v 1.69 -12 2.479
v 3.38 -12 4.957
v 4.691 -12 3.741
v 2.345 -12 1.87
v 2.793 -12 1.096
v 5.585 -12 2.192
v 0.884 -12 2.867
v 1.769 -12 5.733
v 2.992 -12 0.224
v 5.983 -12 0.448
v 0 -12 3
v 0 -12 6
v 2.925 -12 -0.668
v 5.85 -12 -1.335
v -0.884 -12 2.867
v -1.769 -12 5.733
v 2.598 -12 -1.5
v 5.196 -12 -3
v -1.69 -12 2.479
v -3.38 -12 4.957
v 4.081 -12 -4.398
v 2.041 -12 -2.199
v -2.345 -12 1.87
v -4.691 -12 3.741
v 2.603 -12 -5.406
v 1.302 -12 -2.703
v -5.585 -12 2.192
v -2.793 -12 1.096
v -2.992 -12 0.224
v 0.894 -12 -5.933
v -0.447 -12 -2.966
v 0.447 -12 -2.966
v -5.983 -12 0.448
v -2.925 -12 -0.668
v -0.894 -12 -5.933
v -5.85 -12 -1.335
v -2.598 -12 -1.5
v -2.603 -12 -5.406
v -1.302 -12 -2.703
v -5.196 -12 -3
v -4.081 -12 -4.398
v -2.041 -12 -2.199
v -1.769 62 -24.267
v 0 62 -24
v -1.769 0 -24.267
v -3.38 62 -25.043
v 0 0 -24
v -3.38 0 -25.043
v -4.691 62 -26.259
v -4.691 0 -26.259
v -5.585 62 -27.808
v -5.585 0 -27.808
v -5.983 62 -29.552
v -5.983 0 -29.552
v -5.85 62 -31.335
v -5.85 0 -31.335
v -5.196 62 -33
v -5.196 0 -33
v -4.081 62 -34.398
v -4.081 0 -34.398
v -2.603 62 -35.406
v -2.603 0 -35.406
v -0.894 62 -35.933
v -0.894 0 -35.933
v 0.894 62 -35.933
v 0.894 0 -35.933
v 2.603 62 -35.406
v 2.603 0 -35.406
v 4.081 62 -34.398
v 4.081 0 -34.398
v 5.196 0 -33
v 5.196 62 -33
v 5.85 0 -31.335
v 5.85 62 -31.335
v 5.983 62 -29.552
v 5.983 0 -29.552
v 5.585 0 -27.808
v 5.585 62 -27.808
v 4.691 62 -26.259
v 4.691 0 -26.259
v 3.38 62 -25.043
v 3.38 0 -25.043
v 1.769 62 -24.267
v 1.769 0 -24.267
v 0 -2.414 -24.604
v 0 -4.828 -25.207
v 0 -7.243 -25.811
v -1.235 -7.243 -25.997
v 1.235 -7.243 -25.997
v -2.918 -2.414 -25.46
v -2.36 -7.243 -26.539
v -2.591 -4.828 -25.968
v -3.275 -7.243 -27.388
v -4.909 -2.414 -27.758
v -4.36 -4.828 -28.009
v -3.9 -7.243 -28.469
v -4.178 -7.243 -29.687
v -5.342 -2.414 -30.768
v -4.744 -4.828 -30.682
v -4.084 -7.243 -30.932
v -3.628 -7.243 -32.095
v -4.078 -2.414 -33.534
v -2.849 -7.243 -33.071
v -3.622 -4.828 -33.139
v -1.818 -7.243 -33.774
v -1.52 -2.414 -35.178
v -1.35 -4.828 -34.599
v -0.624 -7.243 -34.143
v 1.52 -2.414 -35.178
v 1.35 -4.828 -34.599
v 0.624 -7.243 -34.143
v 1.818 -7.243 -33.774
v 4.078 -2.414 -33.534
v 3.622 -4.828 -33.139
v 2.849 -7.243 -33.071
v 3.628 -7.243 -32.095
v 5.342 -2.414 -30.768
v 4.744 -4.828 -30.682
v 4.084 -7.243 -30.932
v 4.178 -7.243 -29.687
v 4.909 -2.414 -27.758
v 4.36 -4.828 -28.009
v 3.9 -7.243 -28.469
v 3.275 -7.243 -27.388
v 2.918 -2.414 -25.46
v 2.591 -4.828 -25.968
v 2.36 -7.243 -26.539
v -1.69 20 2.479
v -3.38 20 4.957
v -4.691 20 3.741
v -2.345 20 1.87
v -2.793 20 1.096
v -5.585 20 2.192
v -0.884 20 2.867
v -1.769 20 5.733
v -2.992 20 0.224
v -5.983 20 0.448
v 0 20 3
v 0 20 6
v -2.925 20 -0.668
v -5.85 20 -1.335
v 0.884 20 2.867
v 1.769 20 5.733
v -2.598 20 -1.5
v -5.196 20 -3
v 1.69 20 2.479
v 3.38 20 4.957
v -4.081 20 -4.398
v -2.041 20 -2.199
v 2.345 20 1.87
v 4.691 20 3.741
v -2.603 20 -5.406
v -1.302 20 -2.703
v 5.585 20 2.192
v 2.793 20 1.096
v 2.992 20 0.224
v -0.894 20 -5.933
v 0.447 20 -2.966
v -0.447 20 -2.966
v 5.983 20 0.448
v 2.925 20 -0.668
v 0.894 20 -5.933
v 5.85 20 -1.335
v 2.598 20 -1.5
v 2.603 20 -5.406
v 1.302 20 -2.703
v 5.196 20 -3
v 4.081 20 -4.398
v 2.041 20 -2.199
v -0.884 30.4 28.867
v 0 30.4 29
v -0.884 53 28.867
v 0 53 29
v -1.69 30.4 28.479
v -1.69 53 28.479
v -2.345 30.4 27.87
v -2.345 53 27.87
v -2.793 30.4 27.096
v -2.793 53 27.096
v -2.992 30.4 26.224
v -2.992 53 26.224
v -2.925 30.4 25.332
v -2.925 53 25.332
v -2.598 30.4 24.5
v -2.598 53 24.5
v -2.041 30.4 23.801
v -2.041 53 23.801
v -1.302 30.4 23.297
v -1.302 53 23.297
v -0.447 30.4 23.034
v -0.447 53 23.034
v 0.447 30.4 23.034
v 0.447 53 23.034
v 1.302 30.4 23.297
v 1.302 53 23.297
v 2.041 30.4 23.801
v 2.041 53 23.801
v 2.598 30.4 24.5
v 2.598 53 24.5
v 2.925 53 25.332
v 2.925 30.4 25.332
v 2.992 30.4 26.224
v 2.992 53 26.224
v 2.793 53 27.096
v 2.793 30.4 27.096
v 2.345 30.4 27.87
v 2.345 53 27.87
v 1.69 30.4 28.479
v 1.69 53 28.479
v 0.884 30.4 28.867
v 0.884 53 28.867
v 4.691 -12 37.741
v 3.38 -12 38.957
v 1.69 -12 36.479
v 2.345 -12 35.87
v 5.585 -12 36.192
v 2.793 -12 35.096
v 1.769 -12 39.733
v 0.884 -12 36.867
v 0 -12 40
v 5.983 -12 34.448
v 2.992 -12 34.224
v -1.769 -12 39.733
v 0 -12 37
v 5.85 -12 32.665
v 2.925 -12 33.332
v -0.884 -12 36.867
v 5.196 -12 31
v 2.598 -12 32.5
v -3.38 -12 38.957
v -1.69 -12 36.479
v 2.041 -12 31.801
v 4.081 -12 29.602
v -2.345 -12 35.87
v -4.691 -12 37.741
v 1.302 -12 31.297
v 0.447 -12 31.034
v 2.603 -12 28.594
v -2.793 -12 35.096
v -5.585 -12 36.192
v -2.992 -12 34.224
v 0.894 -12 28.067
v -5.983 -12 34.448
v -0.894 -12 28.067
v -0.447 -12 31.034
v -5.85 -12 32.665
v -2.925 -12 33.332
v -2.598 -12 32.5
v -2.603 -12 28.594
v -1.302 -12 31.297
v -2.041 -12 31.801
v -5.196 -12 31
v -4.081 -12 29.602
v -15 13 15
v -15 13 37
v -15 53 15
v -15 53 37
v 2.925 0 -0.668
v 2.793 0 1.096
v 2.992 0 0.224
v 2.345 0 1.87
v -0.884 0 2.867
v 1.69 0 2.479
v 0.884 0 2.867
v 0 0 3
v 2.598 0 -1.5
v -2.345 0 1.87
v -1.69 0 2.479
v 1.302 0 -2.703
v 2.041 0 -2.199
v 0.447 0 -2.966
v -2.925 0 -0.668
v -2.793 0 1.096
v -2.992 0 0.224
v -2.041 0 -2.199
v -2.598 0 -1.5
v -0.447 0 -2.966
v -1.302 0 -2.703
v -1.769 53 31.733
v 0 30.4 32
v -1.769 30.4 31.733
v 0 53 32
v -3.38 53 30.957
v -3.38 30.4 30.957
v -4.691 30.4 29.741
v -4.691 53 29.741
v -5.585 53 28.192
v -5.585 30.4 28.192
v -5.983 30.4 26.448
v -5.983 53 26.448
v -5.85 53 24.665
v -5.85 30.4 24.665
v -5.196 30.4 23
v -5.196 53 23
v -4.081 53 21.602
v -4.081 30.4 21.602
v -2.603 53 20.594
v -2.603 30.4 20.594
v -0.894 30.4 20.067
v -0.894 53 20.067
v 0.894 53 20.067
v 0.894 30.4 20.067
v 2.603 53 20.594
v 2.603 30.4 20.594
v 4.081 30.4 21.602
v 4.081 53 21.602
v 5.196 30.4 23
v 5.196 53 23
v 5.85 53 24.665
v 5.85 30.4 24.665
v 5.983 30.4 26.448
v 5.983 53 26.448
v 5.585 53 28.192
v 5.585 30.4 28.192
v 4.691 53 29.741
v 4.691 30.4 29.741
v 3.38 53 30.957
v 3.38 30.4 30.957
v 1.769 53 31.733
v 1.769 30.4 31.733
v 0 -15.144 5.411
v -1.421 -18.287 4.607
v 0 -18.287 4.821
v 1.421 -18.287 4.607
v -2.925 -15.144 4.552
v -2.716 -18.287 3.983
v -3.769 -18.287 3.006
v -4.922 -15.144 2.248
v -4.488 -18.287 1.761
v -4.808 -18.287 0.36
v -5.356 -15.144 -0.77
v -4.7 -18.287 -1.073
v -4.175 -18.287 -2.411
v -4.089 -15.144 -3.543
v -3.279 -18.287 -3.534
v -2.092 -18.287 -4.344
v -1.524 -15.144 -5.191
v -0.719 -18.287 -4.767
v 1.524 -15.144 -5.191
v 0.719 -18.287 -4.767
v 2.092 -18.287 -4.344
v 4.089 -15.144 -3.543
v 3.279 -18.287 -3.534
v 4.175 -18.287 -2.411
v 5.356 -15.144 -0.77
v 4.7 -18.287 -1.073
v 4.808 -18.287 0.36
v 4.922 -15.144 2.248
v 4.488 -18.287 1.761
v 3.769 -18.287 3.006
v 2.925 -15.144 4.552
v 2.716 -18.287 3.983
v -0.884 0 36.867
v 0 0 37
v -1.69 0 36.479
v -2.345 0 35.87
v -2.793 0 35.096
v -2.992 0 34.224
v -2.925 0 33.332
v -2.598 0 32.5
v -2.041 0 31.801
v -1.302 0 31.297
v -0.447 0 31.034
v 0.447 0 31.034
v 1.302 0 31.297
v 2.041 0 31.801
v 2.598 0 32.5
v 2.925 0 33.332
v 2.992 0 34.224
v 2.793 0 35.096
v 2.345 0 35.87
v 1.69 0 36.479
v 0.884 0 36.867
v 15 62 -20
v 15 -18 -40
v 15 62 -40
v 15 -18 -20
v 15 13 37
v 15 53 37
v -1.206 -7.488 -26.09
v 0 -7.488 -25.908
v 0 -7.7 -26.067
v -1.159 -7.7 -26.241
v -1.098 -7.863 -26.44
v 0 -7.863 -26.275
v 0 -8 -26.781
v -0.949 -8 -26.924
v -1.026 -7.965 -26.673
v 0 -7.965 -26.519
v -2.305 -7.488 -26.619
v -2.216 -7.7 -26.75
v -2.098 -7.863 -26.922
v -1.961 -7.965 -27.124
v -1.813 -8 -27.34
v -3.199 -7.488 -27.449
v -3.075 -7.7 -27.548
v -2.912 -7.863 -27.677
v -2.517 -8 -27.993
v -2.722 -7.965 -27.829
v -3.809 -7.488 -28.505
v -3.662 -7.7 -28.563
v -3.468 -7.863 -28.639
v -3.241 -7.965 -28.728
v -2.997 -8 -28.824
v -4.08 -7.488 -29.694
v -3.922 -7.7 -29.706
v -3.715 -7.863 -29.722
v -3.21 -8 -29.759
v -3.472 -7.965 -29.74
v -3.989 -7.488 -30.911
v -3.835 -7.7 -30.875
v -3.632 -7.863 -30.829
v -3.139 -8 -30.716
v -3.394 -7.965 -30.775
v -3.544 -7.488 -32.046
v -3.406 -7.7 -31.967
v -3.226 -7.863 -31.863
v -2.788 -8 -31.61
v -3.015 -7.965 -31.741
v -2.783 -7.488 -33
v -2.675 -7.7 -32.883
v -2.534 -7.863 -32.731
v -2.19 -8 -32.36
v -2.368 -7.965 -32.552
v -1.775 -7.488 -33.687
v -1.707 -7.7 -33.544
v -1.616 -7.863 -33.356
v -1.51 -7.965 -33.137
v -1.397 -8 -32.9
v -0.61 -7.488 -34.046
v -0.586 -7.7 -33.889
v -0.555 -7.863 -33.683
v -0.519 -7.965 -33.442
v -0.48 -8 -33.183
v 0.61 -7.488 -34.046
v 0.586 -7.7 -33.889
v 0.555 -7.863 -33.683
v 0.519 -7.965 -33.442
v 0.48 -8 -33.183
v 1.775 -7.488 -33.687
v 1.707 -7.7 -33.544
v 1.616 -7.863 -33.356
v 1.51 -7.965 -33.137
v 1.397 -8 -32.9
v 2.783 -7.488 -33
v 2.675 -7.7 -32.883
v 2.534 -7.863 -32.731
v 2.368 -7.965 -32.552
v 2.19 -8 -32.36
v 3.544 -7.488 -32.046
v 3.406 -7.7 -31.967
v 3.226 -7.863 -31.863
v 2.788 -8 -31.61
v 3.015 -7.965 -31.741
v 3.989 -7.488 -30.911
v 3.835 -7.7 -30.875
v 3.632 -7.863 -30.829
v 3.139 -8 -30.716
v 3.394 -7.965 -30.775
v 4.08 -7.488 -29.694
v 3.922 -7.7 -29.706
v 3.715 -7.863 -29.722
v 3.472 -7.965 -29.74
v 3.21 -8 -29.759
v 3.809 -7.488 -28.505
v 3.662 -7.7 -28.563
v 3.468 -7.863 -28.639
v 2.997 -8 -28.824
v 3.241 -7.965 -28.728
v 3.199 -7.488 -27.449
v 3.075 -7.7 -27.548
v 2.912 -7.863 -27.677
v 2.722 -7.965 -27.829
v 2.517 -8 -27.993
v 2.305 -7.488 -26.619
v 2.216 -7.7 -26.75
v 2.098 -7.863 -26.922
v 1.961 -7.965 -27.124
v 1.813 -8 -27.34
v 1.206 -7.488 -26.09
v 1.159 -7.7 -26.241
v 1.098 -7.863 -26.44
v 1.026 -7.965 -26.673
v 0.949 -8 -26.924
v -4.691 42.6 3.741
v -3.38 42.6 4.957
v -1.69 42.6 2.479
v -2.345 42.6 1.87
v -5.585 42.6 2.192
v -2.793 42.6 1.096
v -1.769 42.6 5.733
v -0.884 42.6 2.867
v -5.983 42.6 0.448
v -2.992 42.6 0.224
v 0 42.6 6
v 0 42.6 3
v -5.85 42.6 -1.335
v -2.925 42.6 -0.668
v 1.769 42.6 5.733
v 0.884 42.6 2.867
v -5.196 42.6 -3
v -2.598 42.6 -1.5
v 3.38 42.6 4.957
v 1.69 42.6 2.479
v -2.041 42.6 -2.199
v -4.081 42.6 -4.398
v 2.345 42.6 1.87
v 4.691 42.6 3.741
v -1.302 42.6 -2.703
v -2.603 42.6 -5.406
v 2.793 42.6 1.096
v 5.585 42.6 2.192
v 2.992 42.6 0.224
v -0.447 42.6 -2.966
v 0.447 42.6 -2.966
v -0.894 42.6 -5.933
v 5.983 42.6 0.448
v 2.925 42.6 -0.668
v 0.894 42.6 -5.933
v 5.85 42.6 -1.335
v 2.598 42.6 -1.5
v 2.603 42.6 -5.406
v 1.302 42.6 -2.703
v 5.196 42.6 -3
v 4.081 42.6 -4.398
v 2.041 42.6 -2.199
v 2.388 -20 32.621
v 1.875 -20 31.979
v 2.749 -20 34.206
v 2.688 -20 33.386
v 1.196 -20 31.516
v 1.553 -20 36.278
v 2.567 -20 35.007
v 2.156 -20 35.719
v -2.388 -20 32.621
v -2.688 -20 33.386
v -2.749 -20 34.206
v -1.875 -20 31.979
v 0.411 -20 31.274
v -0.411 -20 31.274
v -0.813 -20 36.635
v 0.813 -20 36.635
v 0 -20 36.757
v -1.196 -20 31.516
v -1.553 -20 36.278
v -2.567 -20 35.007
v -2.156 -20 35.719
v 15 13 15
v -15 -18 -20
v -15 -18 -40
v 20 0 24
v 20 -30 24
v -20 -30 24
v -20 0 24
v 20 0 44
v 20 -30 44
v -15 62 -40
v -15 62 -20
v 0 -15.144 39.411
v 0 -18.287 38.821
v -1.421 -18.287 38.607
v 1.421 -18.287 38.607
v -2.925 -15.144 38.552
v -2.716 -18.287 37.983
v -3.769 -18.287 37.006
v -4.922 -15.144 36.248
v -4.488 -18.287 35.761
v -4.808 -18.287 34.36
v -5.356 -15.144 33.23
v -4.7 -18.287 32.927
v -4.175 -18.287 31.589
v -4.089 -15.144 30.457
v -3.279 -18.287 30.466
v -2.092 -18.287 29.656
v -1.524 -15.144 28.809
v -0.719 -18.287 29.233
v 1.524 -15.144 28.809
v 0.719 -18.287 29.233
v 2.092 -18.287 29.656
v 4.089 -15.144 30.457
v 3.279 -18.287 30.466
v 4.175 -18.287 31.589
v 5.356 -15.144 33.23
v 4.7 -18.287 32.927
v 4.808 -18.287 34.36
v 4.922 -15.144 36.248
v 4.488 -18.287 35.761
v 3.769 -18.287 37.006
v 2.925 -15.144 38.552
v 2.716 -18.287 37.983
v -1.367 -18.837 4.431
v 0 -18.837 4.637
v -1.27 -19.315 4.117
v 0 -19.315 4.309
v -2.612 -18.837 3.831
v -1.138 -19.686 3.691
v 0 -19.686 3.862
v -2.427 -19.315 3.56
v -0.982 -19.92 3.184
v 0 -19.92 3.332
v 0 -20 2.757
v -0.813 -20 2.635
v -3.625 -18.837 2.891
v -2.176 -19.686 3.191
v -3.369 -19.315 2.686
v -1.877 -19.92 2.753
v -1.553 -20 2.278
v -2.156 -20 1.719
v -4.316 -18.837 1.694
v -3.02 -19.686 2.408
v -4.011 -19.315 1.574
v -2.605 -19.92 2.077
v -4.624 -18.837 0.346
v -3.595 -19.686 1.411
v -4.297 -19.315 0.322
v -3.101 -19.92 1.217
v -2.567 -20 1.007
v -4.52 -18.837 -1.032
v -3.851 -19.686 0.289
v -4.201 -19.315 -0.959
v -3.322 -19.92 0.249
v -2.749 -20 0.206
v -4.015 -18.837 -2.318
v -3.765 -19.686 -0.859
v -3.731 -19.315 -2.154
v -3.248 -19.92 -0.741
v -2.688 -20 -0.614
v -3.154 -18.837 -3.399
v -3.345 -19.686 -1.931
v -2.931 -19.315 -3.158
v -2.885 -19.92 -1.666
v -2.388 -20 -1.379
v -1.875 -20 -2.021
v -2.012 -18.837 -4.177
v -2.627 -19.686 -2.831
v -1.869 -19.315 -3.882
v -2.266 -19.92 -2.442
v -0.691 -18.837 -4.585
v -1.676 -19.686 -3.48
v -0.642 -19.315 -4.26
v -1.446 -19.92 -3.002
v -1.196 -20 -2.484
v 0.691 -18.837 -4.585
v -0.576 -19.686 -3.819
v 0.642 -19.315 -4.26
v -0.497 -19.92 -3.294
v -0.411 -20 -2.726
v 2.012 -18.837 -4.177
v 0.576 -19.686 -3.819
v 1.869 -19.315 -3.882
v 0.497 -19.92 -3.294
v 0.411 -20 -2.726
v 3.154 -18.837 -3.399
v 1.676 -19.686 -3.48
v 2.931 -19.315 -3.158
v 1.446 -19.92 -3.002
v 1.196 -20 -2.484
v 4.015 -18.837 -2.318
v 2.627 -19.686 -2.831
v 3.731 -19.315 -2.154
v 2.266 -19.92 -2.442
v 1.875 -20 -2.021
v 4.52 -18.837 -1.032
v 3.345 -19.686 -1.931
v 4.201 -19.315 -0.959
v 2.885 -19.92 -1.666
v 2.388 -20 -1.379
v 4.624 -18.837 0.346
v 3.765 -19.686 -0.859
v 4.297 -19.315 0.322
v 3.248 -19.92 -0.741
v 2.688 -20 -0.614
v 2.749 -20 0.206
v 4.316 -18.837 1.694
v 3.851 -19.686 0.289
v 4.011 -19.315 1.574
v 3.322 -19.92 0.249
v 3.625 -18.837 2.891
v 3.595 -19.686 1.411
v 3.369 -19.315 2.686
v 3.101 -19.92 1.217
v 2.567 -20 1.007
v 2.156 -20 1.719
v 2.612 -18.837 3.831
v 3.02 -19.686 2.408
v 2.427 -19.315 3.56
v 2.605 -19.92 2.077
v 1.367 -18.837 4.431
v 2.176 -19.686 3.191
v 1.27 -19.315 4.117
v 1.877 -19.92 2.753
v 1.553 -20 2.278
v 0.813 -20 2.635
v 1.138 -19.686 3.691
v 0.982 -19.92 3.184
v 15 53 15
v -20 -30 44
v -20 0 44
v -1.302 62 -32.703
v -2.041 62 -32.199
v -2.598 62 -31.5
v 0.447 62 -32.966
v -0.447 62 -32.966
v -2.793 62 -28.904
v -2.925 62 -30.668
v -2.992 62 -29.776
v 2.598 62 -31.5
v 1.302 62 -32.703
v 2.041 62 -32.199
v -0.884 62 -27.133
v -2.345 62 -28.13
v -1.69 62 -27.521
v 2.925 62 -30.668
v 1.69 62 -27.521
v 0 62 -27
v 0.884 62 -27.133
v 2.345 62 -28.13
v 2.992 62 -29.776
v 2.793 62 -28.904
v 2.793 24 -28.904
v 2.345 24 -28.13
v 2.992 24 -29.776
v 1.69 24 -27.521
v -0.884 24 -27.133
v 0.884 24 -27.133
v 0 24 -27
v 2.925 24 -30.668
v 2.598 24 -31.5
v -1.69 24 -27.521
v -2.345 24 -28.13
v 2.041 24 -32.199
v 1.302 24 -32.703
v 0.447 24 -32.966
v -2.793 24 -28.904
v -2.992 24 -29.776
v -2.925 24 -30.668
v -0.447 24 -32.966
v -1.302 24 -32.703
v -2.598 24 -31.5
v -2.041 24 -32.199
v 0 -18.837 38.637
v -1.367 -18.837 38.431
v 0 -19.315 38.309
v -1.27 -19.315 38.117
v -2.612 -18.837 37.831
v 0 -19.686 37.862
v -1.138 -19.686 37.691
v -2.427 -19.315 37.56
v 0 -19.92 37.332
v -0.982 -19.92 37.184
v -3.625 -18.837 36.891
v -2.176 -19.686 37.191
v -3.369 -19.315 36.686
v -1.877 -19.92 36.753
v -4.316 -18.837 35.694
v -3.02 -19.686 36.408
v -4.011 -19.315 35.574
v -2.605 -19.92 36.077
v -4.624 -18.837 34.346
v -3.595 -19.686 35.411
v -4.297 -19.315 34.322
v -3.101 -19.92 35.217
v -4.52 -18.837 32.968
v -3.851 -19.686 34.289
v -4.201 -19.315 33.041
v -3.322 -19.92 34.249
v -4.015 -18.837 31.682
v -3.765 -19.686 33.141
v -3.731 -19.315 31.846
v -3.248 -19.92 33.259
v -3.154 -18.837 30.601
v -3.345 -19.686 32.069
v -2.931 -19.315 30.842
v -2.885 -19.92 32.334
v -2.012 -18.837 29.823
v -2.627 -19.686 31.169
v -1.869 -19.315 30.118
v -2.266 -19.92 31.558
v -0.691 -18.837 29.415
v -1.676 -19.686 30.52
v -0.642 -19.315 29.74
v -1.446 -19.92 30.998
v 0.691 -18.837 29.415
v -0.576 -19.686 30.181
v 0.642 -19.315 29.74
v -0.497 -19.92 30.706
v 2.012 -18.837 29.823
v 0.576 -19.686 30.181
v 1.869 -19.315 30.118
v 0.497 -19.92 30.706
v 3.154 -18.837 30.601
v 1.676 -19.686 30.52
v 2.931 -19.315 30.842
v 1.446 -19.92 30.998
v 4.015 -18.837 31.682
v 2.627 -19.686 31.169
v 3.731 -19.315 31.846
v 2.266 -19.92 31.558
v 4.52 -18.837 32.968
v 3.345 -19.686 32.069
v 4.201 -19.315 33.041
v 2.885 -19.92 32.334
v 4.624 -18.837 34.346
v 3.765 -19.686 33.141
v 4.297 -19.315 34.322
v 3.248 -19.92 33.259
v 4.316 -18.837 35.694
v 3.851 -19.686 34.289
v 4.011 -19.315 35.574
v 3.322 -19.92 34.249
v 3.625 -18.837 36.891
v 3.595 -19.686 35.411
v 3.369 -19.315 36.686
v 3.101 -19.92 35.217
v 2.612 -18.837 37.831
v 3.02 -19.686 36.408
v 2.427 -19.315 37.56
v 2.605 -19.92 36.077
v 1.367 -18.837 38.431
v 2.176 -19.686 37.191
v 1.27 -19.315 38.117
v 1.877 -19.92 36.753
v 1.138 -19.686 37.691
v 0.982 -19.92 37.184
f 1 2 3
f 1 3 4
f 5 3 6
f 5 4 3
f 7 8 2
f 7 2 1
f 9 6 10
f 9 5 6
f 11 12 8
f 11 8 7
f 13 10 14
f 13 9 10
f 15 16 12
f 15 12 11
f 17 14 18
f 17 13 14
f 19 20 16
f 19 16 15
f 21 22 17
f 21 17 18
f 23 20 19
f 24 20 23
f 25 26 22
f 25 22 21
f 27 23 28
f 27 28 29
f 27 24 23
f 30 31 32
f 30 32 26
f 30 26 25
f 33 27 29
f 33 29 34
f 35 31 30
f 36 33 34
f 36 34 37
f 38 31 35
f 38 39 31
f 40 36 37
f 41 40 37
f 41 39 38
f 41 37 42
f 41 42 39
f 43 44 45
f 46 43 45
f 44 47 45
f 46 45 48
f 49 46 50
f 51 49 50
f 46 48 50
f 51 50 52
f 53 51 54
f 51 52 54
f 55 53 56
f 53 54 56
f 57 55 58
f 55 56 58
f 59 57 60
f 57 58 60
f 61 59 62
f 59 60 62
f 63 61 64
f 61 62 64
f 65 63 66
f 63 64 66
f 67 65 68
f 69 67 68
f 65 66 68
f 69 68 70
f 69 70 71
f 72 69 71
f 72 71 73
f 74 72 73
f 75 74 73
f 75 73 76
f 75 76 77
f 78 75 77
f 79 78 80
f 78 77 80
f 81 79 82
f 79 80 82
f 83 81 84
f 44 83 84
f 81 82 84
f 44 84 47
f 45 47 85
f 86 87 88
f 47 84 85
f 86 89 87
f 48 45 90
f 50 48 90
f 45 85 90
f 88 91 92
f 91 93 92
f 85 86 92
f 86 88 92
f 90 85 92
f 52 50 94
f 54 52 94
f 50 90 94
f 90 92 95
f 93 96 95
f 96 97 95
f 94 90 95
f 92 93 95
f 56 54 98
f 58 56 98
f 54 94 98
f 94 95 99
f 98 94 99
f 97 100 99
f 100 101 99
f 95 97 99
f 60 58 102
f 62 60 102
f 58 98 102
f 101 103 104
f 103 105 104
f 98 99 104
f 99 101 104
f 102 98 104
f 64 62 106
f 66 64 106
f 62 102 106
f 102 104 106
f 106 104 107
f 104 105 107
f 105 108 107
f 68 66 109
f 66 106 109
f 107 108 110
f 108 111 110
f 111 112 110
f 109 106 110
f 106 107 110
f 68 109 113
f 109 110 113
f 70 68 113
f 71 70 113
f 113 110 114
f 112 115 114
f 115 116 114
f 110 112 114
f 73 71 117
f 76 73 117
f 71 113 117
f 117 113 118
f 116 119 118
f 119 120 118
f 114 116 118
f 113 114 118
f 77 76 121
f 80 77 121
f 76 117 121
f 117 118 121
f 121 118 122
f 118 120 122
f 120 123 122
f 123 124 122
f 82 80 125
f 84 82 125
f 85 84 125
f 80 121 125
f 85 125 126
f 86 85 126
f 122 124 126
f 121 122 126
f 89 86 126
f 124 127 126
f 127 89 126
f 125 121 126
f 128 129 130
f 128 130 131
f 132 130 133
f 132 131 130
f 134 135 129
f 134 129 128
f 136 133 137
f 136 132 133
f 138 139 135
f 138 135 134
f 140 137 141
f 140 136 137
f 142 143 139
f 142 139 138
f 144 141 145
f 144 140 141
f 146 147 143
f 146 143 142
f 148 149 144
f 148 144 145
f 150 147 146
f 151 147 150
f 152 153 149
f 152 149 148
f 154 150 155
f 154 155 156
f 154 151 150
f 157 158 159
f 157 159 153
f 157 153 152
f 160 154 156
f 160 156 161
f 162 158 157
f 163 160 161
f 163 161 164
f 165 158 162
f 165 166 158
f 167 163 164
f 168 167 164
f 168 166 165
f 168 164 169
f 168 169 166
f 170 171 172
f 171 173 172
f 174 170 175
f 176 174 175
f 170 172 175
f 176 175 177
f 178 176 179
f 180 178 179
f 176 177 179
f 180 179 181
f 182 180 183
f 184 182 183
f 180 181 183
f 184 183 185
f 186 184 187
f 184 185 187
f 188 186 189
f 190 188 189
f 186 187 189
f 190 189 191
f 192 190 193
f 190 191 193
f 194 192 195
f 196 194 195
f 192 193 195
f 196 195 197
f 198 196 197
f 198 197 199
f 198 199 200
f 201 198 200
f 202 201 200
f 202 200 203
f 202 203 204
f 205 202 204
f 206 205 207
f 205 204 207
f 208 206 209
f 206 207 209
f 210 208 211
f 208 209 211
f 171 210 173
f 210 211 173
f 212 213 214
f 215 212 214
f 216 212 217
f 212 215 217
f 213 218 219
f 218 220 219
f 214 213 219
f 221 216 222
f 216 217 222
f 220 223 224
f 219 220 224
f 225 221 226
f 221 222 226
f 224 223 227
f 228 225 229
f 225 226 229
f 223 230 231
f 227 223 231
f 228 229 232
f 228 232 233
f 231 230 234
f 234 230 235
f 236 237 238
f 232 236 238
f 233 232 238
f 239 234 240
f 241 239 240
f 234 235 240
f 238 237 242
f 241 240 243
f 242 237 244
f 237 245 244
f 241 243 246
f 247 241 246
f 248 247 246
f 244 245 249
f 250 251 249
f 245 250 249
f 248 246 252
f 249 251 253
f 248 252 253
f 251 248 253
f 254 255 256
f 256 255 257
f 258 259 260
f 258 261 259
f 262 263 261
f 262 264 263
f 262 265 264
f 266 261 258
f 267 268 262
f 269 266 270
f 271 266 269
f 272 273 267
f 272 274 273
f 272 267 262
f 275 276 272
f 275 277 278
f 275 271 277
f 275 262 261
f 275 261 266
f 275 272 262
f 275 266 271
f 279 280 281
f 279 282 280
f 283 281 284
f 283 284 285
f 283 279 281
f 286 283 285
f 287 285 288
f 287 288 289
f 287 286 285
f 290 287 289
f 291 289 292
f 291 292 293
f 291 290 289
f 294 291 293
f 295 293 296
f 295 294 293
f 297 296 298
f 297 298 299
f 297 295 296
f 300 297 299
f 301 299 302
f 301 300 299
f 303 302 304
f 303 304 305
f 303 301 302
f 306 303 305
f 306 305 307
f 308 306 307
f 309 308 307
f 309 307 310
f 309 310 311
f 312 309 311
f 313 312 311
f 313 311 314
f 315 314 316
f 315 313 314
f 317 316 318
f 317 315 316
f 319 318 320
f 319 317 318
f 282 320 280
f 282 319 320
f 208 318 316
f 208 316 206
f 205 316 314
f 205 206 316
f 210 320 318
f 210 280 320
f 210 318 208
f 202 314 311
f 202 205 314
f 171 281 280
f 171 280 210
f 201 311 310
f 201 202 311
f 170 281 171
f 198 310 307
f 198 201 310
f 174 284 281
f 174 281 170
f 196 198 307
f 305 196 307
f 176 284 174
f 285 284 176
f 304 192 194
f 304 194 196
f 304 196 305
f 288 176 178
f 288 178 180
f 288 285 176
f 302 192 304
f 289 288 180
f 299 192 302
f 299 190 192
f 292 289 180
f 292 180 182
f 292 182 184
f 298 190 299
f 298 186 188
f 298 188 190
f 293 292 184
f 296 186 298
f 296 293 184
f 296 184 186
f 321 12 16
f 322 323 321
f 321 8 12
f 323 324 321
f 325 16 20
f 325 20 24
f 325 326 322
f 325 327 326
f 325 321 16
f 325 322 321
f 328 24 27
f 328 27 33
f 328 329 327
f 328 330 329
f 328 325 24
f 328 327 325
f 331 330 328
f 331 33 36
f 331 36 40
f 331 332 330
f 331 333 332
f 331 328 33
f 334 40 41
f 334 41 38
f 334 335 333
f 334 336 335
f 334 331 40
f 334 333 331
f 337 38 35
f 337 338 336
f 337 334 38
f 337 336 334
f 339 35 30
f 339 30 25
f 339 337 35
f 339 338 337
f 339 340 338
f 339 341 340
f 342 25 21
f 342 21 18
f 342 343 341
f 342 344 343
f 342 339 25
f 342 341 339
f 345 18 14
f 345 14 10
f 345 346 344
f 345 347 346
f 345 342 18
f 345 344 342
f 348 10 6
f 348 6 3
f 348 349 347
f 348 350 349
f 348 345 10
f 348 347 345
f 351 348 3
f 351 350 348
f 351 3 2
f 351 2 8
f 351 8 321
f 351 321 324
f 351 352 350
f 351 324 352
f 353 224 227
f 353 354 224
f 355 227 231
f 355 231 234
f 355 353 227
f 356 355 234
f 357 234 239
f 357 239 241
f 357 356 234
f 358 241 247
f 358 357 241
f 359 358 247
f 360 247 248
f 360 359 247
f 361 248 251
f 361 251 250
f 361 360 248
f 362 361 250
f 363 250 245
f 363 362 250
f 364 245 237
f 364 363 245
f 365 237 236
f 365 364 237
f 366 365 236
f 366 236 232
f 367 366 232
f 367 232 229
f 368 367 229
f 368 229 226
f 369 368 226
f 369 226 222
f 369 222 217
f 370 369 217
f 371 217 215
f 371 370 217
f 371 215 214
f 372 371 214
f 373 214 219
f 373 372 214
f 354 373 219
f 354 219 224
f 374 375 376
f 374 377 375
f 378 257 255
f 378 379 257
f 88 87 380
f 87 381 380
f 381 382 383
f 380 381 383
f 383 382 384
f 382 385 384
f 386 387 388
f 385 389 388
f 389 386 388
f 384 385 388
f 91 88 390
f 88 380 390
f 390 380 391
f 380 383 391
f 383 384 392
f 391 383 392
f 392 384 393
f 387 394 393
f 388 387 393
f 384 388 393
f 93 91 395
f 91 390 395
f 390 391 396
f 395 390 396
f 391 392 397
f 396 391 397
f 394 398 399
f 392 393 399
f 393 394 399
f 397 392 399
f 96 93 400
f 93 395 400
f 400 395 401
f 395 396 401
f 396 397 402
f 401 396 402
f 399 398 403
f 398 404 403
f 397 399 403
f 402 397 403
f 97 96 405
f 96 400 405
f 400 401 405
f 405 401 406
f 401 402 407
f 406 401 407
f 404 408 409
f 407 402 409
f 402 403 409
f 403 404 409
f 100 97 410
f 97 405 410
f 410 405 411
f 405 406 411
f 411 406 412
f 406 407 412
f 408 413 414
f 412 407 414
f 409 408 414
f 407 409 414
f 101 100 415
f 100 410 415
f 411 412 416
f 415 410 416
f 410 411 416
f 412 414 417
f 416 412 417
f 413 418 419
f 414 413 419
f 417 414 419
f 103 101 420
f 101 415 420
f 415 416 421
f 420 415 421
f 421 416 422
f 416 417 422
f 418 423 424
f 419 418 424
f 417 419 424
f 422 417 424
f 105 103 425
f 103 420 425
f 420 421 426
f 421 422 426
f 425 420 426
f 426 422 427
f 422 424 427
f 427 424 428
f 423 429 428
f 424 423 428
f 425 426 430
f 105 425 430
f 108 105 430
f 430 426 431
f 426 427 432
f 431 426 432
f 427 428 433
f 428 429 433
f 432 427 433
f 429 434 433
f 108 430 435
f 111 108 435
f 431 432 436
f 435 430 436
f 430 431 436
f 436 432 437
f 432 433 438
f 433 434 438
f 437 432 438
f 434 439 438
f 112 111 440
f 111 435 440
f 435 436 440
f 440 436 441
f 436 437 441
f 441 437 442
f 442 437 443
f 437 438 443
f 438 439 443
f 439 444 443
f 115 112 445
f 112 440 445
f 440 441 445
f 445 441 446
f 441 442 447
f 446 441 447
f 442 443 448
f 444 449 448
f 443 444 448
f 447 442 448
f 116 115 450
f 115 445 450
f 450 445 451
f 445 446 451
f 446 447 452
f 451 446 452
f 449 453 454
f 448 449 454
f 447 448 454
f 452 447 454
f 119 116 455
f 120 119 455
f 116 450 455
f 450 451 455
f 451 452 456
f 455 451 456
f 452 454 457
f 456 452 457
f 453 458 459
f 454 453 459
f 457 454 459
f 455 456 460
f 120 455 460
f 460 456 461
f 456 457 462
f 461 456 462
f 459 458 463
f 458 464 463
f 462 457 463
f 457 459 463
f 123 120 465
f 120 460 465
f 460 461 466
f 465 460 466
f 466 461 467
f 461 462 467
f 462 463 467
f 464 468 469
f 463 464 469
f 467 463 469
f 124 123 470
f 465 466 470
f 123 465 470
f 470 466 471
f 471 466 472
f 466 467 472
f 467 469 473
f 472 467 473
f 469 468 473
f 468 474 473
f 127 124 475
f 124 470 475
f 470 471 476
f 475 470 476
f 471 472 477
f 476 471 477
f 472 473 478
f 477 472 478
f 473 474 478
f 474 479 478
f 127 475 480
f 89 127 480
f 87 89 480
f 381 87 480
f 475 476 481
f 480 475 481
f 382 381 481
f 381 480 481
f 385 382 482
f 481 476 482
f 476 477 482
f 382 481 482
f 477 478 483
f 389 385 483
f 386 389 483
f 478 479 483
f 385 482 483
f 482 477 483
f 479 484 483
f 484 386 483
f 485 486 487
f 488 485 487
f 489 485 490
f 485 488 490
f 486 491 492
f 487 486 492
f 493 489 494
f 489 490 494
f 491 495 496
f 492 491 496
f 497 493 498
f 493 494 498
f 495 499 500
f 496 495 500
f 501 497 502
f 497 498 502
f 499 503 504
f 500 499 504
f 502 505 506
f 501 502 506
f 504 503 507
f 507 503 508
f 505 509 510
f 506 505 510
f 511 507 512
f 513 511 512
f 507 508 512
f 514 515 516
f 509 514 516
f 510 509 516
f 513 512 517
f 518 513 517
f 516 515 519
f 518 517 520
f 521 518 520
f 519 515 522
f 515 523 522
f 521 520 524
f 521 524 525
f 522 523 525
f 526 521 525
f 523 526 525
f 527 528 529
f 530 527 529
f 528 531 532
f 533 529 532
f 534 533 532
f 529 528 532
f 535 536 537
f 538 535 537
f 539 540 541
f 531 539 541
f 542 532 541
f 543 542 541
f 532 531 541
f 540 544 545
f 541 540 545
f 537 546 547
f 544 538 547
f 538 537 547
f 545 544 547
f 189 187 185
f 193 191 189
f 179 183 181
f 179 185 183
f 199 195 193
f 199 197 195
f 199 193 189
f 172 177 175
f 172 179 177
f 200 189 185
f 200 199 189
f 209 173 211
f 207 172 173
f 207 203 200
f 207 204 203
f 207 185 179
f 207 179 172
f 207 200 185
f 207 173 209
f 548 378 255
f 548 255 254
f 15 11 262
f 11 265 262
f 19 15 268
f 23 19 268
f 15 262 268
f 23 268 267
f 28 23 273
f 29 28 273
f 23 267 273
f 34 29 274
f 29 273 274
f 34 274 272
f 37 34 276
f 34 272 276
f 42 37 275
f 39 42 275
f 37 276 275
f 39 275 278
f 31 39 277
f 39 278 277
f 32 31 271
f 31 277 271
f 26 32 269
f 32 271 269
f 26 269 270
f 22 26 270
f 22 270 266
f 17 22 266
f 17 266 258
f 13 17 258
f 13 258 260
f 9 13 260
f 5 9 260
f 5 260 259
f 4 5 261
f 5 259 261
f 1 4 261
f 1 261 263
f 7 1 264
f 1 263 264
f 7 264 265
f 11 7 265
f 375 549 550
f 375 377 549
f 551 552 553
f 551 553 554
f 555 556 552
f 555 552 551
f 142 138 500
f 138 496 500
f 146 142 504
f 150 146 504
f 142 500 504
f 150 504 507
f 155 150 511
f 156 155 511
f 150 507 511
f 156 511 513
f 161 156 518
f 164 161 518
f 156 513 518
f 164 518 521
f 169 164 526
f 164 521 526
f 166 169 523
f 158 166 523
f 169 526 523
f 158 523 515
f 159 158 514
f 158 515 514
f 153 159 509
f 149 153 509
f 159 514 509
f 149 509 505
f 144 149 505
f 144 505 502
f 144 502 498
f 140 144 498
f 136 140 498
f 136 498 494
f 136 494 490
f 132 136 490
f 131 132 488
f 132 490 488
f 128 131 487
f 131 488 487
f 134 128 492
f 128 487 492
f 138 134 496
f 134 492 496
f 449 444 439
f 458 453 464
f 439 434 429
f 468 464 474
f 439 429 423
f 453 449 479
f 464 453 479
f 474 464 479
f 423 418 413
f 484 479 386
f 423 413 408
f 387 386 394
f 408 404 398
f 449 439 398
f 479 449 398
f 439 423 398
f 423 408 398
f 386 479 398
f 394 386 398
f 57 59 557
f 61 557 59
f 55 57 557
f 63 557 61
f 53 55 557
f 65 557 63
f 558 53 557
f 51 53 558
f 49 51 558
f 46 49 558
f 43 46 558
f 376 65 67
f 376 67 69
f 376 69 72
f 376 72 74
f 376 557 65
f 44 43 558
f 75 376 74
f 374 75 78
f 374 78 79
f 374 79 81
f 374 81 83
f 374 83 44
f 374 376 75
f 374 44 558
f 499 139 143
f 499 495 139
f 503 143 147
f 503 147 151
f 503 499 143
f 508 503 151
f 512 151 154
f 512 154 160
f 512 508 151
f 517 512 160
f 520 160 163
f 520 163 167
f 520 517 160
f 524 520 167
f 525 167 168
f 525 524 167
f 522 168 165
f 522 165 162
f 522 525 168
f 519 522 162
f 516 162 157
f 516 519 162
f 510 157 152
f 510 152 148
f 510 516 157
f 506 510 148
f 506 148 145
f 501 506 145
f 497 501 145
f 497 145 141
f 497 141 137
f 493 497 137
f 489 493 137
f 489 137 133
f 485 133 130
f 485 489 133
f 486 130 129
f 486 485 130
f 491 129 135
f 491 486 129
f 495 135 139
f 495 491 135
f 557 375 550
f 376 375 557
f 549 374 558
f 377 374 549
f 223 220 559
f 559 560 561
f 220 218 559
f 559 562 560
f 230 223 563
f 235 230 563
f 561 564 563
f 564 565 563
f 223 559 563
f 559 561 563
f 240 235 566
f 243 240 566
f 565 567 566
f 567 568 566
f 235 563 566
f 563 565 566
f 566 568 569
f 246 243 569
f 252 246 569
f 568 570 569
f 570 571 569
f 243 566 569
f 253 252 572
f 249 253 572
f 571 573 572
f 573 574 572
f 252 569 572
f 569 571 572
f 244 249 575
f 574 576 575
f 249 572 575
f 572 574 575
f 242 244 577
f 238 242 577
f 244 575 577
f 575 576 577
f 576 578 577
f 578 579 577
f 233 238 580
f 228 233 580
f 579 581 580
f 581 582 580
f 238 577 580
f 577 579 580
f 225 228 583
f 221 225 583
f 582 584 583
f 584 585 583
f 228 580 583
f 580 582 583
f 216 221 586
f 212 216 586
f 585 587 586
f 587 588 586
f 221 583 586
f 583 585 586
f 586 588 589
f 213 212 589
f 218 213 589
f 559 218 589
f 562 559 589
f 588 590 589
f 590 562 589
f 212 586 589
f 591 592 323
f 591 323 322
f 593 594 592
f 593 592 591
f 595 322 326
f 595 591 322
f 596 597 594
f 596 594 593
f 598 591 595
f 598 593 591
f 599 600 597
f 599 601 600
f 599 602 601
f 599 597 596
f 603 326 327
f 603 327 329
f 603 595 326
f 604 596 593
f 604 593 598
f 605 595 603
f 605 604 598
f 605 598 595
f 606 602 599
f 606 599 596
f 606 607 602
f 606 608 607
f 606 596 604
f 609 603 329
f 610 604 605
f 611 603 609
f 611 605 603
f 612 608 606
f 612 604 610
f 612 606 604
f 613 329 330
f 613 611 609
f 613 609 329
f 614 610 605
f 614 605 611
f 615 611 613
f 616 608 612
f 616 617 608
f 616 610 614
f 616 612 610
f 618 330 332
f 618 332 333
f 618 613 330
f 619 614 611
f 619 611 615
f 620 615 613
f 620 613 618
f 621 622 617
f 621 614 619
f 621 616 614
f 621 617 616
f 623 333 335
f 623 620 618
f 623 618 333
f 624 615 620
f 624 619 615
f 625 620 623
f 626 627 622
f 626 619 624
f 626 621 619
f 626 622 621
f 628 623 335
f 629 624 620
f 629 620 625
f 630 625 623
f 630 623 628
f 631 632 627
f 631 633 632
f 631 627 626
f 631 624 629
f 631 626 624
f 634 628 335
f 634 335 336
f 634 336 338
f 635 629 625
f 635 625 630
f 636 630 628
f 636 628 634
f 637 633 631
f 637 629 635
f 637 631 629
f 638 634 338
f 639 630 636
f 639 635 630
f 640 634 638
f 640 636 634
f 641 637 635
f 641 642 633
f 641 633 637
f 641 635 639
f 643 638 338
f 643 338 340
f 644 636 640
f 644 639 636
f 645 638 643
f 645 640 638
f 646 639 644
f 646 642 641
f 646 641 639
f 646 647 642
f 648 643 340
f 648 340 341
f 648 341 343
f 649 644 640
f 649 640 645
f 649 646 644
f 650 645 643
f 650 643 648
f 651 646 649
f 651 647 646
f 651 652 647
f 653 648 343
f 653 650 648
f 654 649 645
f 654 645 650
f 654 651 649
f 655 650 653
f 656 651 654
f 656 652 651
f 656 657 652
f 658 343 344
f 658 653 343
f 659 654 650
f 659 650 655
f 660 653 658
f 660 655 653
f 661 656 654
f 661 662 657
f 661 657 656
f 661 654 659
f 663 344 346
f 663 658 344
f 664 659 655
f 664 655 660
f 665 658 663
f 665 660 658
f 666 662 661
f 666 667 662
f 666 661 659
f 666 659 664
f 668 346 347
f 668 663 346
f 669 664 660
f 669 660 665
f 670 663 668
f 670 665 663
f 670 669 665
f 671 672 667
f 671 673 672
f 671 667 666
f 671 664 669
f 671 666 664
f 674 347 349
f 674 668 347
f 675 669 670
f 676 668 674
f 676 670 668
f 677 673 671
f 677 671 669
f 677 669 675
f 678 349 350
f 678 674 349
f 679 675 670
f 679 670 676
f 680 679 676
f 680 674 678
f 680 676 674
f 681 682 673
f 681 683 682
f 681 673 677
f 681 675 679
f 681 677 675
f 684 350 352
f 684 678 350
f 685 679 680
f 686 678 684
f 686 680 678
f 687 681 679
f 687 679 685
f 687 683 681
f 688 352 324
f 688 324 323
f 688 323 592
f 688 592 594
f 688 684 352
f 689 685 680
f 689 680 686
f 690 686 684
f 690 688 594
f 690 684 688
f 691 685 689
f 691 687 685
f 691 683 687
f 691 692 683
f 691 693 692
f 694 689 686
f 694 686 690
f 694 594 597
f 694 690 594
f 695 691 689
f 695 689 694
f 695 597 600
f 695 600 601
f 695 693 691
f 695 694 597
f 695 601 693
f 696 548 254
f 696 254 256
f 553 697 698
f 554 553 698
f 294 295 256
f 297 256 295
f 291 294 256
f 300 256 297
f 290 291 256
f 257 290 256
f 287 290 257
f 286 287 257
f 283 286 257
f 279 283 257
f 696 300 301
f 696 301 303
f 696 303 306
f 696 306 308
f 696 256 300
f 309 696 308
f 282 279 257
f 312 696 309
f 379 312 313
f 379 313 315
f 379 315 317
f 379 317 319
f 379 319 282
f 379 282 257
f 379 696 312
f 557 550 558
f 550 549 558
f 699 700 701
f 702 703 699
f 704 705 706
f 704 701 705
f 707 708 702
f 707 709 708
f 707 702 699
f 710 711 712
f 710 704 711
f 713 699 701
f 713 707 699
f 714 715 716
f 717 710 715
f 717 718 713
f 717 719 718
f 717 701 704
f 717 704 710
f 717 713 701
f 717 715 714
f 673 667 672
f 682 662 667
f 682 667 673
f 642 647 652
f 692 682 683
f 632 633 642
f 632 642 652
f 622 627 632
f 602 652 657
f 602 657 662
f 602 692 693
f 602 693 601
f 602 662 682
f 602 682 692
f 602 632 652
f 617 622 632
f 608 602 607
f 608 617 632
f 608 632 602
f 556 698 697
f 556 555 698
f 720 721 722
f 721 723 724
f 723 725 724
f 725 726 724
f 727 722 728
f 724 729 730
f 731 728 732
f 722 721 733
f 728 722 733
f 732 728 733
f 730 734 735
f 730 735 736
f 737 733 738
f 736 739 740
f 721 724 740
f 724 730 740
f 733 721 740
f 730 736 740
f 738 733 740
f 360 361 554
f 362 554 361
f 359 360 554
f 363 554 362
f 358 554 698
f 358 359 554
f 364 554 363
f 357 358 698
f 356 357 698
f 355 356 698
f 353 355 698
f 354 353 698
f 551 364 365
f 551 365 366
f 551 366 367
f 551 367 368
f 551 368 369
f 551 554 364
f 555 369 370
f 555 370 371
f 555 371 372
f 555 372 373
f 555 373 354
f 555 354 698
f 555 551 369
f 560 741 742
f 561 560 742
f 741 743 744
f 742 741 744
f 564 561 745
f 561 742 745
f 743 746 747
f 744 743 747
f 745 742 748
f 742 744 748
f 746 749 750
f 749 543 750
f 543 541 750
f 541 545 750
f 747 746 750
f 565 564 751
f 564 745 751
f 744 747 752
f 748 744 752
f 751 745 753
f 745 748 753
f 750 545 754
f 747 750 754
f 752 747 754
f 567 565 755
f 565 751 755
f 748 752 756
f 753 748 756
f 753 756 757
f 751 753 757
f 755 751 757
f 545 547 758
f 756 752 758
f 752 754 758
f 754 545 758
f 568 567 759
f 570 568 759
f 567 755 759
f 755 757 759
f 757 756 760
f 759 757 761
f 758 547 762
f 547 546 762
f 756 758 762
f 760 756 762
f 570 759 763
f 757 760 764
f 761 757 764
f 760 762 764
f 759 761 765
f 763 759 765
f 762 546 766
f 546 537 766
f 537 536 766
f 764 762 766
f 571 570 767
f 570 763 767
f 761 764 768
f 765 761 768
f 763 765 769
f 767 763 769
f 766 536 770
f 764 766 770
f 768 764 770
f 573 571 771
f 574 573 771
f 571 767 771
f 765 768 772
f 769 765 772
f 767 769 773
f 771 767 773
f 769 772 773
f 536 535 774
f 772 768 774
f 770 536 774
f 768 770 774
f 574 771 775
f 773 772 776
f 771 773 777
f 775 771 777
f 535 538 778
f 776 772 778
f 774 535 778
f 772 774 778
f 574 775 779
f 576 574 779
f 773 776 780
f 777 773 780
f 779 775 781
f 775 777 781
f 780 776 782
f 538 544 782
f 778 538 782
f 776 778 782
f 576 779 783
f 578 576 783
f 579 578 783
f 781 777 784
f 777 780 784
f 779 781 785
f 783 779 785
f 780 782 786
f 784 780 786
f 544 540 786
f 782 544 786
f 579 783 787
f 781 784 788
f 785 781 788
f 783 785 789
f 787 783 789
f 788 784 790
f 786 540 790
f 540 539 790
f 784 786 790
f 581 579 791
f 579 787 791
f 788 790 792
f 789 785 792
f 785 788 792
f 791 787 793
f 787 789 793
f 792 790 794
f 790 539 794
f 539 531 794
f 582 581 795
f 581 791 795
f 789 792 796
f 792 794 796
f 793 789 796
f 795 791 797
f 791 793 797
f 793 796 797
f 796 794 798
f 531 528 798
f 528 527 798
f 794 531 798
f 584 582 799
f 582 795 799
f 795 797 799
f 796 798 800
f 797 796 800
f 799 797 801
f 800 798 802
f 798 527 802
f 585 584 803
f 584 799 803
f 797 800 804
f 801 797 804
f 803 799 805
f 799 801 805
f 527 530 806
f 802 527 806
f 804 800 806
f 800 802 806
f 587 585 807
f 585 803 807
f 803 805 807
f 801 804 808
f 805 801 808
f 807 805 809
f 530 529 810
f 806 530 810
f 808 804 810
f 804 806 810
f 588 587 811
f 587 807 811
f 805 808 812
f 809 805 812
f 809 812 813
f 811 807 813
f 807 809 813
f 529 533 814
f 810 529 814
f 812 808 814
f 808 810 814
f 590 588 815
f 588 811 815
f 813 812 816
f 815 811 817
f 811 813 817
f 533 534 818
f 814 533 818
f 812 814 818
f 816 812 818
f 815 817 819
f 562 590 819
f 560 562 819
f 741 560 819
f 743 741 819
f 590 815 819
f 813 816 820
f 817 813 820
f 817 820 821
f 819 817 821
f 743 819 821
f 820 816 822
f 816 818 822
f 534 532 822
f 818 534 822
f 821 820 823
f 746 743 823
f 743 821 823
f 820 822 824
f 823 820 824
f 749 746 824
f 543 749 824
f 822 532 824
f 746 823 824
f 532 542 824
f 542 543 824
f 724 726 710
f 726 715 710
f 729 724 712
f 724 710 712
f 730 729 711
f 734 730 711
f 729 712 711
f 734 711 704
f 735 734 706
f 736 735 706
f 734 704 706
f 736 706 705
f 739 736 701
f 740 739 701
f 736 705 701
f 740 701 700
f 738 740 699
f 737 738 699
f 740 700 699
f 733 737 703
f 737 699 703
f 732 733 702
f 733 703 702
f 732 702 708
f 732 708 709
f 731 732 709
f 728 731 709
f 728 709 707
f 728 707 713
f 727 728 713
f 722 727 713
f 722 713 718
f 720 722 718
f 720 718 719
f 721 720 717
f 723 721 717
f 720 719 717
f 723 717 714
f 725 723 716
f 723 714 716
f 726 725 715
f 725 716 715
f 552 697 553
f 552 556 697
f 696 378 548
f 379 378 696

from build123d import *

# Parameters (mm, degrees)
F0_W      = 12
F0_H      = 3
F2_W      = 22.6
F2_H      = 3
F4_W      = 12
F4_H      = 1.5
F4_H_2    = 3
F5_DEPTH  = 20
F7_W      = 22.6
F7_H      = 3
F8_DEPTH  = 15
F10_R     = 2.1
F10_2_R   = 2.1
F11_W     = 38
F11_H     = 3
F11_W_2   = 24
F12_DEPTH = 15


with BuildPart() as f1:
    # F0 (on Right) → F1 (revolve)
    with BuildSketch(Plane.YZ):
        Polygon((-20, 0), (-12, 0), (-12, 3), (-12, 6), (-20, 4.5), align=None)
        with Locations((-6, 1.5)):
            Rectangle(F0_W, F0_H)
    revolve(axis=Axis((0, -6, 0), (0, -1, 0)))

    # F10#2
    f10_2_edges = [f1.edges().sort_by_distance(p)[0] for p in [
        (0, -20, -4.5),
    ]]
    fillet(f10_2_edges, radius=F10_2_R)


with BuildPart() as f3:
    # F2 (on Right) → F3 (revolve)
    with BuildSketch(Plane.YZ):
        with Locations((31.3, 4.5)):
            Rectangle(F2_W, F2_H)
    revolve(axis=Axis((0, 31.3, 0), (0, 1, 0)))


with BuildPart() as f5:
    # F4 (on Right) → F5 (new body, symmetric)
    with BuildSketch(Plane.YZ):
        Polygon((-30, 44), (-30, 34), (-20, 34), (-20, 38.5), (-12, 40), (-12, 37), (0, 37), (0, 44), align=None)
        Polygon((-30, 24), (0, 24), (0, 32.5), (-12, 32.5), (-12, 34), (-20, 34), (-30, 34), align=None)
        with Locations((-6, 33.25)):
            Rectangle(F4_W, F4_H)
        Polygon((-20, 38.5), (-20, 34), (-12, 34), (-12, 37), (-12, 40), align=None)
        with Locations((-6, 35.5)):
            Rectangle(F4_W, F4_H_2)
    extrude(amount=F5_DEPTH, both=True)

    # F4 (on Right) → F6 (revolve, cut)
    with BuildSketch(Plane.YZ):
        Polygon((-20, 38.5), (-20, 34), (-12, 34), (-12, 37), (-12, 40), align=None)
        with Locations((-6, 35.5)):
            Rectangle(F4_W, F4_H_2)
    revolve(axis=Axis((0, -15, 34), (0, -1, 0)), mode=Mode.SUBTRACT)

    # F10
    f10_edges = [f5.edges().sort_by_distance(p)[0] for p in [
        (0, -20, 29.5),
    ]]
    fillet(f10_edges, radius=F10_R)


with BuildPart() as f8:
    # F7 (on Right) → F8 (new body, symmetric)
    with BuildSketch(Plane.YZ):
        Polygon((53, 37), (13, 37), (13, 15), (53, 15), (53, 26), (30.4, 26), (30.4, 29), (30.4, 32), (53, 32), align=None)
        with Locations((41.7, 27.5)):
            Rectangle(F7_W, F7_H)
        with Locations((41.7, 30.5)):
            Rectangle(F7_W, F7_H)
    extrude(amount=F8_DEPTH, both=True)

    # F7 (on Right) → F9 (revolve, cut)
    with BuildSketch(Plane.YZ):
        with Locations((41.7, 30.5)):
            Rectangle(F7_W, F7_H)
    revolve(axis=Axis((0, 41.7, 26), (0, -1, 0)), mode=Mode.SUBTRACT)


with BuildPart() as f12:
    # F11 (on Right) → F12 (new body, symmetric)
    with BuildSketch(Plane.YZ):
        Polygon((24, -30), (0, -30), (-8, -30), (-18, -30), (-18, -40), (62, -40), (62, -30), align=None)
        with BuildLine():
            Line((-7.242535625, -25.8106339063), (0, -24))
            Line((0, -24), (62, -24))
            Line((62, -24), (62, -20))
            Line((62, -20), (-18, -20))
            Line((-18, -20), (-18, -30))
            Line((-18, -30), (-8, -30))
            Line((-8, -30), (-8, -26.7807764064))
            ThreePointArc((-8, -26.7807764064), (-7.788205438, -26.165364197), (-7.242535625, -25.8106339063))
        make_face()
        with Locations((43, -28.5)):
            Rectangle(F11_W, F11_H)
        Polygon((62, -24), (0, -24), (0, -27), (24, -27), (62, -27), align=None)
        with BuildLine():
            Line((0, -27), (0, -24))
            Line((0, -24), (-7.242535625, -25.8106339063))
            ThreePointArc((-7.242535625, -25.8106339063), (-7.788205438, -26.165364197), (-8, -26.7807764064))
            Line((-8, -26.7807764064), (-8, -30))
            Line((-8, -30), (0, -30))
            Line((0, -30), (0, -27))
        make_face()
        with Locations((12, -28.5)):
            Rectangle(F11_W_2, F11_H)
    extrude(amount=F12_DEPTH, both=True)

    # F11 (on Right) → F13 (revolve, cut)
    with BuildSketch(Plane.YZ):
        with BuildLine():
            Line((0, -27), (0, -24))
            Line((0, -24), (-7.242535625, -25.8106339063))
            ThreePointArc((-7.242535625, -25.8106339063), (-7.788205438, -26.165364197), (-8, -26.7807764064))
            Line((-8, -26.7807764064), (-8, -30))
            Line((-8, -30), (0, -30))
            Line((0, -30), (0, -27))
        make_face()
        with Locations((12, -28.5)):
            Rectangle(F11_W_2, F11_H)
        Polygon((62, -24), (0, -24), (0, -27), (24, -27), (62, -27), align=None)
    revolve(axis=Axis((0, 22, -30), (0, -1, 0)), mode=Mode.SUBTRACT)


solid = Compound([f1.part, f3.part, f5.part, f8.part, f12.part])
